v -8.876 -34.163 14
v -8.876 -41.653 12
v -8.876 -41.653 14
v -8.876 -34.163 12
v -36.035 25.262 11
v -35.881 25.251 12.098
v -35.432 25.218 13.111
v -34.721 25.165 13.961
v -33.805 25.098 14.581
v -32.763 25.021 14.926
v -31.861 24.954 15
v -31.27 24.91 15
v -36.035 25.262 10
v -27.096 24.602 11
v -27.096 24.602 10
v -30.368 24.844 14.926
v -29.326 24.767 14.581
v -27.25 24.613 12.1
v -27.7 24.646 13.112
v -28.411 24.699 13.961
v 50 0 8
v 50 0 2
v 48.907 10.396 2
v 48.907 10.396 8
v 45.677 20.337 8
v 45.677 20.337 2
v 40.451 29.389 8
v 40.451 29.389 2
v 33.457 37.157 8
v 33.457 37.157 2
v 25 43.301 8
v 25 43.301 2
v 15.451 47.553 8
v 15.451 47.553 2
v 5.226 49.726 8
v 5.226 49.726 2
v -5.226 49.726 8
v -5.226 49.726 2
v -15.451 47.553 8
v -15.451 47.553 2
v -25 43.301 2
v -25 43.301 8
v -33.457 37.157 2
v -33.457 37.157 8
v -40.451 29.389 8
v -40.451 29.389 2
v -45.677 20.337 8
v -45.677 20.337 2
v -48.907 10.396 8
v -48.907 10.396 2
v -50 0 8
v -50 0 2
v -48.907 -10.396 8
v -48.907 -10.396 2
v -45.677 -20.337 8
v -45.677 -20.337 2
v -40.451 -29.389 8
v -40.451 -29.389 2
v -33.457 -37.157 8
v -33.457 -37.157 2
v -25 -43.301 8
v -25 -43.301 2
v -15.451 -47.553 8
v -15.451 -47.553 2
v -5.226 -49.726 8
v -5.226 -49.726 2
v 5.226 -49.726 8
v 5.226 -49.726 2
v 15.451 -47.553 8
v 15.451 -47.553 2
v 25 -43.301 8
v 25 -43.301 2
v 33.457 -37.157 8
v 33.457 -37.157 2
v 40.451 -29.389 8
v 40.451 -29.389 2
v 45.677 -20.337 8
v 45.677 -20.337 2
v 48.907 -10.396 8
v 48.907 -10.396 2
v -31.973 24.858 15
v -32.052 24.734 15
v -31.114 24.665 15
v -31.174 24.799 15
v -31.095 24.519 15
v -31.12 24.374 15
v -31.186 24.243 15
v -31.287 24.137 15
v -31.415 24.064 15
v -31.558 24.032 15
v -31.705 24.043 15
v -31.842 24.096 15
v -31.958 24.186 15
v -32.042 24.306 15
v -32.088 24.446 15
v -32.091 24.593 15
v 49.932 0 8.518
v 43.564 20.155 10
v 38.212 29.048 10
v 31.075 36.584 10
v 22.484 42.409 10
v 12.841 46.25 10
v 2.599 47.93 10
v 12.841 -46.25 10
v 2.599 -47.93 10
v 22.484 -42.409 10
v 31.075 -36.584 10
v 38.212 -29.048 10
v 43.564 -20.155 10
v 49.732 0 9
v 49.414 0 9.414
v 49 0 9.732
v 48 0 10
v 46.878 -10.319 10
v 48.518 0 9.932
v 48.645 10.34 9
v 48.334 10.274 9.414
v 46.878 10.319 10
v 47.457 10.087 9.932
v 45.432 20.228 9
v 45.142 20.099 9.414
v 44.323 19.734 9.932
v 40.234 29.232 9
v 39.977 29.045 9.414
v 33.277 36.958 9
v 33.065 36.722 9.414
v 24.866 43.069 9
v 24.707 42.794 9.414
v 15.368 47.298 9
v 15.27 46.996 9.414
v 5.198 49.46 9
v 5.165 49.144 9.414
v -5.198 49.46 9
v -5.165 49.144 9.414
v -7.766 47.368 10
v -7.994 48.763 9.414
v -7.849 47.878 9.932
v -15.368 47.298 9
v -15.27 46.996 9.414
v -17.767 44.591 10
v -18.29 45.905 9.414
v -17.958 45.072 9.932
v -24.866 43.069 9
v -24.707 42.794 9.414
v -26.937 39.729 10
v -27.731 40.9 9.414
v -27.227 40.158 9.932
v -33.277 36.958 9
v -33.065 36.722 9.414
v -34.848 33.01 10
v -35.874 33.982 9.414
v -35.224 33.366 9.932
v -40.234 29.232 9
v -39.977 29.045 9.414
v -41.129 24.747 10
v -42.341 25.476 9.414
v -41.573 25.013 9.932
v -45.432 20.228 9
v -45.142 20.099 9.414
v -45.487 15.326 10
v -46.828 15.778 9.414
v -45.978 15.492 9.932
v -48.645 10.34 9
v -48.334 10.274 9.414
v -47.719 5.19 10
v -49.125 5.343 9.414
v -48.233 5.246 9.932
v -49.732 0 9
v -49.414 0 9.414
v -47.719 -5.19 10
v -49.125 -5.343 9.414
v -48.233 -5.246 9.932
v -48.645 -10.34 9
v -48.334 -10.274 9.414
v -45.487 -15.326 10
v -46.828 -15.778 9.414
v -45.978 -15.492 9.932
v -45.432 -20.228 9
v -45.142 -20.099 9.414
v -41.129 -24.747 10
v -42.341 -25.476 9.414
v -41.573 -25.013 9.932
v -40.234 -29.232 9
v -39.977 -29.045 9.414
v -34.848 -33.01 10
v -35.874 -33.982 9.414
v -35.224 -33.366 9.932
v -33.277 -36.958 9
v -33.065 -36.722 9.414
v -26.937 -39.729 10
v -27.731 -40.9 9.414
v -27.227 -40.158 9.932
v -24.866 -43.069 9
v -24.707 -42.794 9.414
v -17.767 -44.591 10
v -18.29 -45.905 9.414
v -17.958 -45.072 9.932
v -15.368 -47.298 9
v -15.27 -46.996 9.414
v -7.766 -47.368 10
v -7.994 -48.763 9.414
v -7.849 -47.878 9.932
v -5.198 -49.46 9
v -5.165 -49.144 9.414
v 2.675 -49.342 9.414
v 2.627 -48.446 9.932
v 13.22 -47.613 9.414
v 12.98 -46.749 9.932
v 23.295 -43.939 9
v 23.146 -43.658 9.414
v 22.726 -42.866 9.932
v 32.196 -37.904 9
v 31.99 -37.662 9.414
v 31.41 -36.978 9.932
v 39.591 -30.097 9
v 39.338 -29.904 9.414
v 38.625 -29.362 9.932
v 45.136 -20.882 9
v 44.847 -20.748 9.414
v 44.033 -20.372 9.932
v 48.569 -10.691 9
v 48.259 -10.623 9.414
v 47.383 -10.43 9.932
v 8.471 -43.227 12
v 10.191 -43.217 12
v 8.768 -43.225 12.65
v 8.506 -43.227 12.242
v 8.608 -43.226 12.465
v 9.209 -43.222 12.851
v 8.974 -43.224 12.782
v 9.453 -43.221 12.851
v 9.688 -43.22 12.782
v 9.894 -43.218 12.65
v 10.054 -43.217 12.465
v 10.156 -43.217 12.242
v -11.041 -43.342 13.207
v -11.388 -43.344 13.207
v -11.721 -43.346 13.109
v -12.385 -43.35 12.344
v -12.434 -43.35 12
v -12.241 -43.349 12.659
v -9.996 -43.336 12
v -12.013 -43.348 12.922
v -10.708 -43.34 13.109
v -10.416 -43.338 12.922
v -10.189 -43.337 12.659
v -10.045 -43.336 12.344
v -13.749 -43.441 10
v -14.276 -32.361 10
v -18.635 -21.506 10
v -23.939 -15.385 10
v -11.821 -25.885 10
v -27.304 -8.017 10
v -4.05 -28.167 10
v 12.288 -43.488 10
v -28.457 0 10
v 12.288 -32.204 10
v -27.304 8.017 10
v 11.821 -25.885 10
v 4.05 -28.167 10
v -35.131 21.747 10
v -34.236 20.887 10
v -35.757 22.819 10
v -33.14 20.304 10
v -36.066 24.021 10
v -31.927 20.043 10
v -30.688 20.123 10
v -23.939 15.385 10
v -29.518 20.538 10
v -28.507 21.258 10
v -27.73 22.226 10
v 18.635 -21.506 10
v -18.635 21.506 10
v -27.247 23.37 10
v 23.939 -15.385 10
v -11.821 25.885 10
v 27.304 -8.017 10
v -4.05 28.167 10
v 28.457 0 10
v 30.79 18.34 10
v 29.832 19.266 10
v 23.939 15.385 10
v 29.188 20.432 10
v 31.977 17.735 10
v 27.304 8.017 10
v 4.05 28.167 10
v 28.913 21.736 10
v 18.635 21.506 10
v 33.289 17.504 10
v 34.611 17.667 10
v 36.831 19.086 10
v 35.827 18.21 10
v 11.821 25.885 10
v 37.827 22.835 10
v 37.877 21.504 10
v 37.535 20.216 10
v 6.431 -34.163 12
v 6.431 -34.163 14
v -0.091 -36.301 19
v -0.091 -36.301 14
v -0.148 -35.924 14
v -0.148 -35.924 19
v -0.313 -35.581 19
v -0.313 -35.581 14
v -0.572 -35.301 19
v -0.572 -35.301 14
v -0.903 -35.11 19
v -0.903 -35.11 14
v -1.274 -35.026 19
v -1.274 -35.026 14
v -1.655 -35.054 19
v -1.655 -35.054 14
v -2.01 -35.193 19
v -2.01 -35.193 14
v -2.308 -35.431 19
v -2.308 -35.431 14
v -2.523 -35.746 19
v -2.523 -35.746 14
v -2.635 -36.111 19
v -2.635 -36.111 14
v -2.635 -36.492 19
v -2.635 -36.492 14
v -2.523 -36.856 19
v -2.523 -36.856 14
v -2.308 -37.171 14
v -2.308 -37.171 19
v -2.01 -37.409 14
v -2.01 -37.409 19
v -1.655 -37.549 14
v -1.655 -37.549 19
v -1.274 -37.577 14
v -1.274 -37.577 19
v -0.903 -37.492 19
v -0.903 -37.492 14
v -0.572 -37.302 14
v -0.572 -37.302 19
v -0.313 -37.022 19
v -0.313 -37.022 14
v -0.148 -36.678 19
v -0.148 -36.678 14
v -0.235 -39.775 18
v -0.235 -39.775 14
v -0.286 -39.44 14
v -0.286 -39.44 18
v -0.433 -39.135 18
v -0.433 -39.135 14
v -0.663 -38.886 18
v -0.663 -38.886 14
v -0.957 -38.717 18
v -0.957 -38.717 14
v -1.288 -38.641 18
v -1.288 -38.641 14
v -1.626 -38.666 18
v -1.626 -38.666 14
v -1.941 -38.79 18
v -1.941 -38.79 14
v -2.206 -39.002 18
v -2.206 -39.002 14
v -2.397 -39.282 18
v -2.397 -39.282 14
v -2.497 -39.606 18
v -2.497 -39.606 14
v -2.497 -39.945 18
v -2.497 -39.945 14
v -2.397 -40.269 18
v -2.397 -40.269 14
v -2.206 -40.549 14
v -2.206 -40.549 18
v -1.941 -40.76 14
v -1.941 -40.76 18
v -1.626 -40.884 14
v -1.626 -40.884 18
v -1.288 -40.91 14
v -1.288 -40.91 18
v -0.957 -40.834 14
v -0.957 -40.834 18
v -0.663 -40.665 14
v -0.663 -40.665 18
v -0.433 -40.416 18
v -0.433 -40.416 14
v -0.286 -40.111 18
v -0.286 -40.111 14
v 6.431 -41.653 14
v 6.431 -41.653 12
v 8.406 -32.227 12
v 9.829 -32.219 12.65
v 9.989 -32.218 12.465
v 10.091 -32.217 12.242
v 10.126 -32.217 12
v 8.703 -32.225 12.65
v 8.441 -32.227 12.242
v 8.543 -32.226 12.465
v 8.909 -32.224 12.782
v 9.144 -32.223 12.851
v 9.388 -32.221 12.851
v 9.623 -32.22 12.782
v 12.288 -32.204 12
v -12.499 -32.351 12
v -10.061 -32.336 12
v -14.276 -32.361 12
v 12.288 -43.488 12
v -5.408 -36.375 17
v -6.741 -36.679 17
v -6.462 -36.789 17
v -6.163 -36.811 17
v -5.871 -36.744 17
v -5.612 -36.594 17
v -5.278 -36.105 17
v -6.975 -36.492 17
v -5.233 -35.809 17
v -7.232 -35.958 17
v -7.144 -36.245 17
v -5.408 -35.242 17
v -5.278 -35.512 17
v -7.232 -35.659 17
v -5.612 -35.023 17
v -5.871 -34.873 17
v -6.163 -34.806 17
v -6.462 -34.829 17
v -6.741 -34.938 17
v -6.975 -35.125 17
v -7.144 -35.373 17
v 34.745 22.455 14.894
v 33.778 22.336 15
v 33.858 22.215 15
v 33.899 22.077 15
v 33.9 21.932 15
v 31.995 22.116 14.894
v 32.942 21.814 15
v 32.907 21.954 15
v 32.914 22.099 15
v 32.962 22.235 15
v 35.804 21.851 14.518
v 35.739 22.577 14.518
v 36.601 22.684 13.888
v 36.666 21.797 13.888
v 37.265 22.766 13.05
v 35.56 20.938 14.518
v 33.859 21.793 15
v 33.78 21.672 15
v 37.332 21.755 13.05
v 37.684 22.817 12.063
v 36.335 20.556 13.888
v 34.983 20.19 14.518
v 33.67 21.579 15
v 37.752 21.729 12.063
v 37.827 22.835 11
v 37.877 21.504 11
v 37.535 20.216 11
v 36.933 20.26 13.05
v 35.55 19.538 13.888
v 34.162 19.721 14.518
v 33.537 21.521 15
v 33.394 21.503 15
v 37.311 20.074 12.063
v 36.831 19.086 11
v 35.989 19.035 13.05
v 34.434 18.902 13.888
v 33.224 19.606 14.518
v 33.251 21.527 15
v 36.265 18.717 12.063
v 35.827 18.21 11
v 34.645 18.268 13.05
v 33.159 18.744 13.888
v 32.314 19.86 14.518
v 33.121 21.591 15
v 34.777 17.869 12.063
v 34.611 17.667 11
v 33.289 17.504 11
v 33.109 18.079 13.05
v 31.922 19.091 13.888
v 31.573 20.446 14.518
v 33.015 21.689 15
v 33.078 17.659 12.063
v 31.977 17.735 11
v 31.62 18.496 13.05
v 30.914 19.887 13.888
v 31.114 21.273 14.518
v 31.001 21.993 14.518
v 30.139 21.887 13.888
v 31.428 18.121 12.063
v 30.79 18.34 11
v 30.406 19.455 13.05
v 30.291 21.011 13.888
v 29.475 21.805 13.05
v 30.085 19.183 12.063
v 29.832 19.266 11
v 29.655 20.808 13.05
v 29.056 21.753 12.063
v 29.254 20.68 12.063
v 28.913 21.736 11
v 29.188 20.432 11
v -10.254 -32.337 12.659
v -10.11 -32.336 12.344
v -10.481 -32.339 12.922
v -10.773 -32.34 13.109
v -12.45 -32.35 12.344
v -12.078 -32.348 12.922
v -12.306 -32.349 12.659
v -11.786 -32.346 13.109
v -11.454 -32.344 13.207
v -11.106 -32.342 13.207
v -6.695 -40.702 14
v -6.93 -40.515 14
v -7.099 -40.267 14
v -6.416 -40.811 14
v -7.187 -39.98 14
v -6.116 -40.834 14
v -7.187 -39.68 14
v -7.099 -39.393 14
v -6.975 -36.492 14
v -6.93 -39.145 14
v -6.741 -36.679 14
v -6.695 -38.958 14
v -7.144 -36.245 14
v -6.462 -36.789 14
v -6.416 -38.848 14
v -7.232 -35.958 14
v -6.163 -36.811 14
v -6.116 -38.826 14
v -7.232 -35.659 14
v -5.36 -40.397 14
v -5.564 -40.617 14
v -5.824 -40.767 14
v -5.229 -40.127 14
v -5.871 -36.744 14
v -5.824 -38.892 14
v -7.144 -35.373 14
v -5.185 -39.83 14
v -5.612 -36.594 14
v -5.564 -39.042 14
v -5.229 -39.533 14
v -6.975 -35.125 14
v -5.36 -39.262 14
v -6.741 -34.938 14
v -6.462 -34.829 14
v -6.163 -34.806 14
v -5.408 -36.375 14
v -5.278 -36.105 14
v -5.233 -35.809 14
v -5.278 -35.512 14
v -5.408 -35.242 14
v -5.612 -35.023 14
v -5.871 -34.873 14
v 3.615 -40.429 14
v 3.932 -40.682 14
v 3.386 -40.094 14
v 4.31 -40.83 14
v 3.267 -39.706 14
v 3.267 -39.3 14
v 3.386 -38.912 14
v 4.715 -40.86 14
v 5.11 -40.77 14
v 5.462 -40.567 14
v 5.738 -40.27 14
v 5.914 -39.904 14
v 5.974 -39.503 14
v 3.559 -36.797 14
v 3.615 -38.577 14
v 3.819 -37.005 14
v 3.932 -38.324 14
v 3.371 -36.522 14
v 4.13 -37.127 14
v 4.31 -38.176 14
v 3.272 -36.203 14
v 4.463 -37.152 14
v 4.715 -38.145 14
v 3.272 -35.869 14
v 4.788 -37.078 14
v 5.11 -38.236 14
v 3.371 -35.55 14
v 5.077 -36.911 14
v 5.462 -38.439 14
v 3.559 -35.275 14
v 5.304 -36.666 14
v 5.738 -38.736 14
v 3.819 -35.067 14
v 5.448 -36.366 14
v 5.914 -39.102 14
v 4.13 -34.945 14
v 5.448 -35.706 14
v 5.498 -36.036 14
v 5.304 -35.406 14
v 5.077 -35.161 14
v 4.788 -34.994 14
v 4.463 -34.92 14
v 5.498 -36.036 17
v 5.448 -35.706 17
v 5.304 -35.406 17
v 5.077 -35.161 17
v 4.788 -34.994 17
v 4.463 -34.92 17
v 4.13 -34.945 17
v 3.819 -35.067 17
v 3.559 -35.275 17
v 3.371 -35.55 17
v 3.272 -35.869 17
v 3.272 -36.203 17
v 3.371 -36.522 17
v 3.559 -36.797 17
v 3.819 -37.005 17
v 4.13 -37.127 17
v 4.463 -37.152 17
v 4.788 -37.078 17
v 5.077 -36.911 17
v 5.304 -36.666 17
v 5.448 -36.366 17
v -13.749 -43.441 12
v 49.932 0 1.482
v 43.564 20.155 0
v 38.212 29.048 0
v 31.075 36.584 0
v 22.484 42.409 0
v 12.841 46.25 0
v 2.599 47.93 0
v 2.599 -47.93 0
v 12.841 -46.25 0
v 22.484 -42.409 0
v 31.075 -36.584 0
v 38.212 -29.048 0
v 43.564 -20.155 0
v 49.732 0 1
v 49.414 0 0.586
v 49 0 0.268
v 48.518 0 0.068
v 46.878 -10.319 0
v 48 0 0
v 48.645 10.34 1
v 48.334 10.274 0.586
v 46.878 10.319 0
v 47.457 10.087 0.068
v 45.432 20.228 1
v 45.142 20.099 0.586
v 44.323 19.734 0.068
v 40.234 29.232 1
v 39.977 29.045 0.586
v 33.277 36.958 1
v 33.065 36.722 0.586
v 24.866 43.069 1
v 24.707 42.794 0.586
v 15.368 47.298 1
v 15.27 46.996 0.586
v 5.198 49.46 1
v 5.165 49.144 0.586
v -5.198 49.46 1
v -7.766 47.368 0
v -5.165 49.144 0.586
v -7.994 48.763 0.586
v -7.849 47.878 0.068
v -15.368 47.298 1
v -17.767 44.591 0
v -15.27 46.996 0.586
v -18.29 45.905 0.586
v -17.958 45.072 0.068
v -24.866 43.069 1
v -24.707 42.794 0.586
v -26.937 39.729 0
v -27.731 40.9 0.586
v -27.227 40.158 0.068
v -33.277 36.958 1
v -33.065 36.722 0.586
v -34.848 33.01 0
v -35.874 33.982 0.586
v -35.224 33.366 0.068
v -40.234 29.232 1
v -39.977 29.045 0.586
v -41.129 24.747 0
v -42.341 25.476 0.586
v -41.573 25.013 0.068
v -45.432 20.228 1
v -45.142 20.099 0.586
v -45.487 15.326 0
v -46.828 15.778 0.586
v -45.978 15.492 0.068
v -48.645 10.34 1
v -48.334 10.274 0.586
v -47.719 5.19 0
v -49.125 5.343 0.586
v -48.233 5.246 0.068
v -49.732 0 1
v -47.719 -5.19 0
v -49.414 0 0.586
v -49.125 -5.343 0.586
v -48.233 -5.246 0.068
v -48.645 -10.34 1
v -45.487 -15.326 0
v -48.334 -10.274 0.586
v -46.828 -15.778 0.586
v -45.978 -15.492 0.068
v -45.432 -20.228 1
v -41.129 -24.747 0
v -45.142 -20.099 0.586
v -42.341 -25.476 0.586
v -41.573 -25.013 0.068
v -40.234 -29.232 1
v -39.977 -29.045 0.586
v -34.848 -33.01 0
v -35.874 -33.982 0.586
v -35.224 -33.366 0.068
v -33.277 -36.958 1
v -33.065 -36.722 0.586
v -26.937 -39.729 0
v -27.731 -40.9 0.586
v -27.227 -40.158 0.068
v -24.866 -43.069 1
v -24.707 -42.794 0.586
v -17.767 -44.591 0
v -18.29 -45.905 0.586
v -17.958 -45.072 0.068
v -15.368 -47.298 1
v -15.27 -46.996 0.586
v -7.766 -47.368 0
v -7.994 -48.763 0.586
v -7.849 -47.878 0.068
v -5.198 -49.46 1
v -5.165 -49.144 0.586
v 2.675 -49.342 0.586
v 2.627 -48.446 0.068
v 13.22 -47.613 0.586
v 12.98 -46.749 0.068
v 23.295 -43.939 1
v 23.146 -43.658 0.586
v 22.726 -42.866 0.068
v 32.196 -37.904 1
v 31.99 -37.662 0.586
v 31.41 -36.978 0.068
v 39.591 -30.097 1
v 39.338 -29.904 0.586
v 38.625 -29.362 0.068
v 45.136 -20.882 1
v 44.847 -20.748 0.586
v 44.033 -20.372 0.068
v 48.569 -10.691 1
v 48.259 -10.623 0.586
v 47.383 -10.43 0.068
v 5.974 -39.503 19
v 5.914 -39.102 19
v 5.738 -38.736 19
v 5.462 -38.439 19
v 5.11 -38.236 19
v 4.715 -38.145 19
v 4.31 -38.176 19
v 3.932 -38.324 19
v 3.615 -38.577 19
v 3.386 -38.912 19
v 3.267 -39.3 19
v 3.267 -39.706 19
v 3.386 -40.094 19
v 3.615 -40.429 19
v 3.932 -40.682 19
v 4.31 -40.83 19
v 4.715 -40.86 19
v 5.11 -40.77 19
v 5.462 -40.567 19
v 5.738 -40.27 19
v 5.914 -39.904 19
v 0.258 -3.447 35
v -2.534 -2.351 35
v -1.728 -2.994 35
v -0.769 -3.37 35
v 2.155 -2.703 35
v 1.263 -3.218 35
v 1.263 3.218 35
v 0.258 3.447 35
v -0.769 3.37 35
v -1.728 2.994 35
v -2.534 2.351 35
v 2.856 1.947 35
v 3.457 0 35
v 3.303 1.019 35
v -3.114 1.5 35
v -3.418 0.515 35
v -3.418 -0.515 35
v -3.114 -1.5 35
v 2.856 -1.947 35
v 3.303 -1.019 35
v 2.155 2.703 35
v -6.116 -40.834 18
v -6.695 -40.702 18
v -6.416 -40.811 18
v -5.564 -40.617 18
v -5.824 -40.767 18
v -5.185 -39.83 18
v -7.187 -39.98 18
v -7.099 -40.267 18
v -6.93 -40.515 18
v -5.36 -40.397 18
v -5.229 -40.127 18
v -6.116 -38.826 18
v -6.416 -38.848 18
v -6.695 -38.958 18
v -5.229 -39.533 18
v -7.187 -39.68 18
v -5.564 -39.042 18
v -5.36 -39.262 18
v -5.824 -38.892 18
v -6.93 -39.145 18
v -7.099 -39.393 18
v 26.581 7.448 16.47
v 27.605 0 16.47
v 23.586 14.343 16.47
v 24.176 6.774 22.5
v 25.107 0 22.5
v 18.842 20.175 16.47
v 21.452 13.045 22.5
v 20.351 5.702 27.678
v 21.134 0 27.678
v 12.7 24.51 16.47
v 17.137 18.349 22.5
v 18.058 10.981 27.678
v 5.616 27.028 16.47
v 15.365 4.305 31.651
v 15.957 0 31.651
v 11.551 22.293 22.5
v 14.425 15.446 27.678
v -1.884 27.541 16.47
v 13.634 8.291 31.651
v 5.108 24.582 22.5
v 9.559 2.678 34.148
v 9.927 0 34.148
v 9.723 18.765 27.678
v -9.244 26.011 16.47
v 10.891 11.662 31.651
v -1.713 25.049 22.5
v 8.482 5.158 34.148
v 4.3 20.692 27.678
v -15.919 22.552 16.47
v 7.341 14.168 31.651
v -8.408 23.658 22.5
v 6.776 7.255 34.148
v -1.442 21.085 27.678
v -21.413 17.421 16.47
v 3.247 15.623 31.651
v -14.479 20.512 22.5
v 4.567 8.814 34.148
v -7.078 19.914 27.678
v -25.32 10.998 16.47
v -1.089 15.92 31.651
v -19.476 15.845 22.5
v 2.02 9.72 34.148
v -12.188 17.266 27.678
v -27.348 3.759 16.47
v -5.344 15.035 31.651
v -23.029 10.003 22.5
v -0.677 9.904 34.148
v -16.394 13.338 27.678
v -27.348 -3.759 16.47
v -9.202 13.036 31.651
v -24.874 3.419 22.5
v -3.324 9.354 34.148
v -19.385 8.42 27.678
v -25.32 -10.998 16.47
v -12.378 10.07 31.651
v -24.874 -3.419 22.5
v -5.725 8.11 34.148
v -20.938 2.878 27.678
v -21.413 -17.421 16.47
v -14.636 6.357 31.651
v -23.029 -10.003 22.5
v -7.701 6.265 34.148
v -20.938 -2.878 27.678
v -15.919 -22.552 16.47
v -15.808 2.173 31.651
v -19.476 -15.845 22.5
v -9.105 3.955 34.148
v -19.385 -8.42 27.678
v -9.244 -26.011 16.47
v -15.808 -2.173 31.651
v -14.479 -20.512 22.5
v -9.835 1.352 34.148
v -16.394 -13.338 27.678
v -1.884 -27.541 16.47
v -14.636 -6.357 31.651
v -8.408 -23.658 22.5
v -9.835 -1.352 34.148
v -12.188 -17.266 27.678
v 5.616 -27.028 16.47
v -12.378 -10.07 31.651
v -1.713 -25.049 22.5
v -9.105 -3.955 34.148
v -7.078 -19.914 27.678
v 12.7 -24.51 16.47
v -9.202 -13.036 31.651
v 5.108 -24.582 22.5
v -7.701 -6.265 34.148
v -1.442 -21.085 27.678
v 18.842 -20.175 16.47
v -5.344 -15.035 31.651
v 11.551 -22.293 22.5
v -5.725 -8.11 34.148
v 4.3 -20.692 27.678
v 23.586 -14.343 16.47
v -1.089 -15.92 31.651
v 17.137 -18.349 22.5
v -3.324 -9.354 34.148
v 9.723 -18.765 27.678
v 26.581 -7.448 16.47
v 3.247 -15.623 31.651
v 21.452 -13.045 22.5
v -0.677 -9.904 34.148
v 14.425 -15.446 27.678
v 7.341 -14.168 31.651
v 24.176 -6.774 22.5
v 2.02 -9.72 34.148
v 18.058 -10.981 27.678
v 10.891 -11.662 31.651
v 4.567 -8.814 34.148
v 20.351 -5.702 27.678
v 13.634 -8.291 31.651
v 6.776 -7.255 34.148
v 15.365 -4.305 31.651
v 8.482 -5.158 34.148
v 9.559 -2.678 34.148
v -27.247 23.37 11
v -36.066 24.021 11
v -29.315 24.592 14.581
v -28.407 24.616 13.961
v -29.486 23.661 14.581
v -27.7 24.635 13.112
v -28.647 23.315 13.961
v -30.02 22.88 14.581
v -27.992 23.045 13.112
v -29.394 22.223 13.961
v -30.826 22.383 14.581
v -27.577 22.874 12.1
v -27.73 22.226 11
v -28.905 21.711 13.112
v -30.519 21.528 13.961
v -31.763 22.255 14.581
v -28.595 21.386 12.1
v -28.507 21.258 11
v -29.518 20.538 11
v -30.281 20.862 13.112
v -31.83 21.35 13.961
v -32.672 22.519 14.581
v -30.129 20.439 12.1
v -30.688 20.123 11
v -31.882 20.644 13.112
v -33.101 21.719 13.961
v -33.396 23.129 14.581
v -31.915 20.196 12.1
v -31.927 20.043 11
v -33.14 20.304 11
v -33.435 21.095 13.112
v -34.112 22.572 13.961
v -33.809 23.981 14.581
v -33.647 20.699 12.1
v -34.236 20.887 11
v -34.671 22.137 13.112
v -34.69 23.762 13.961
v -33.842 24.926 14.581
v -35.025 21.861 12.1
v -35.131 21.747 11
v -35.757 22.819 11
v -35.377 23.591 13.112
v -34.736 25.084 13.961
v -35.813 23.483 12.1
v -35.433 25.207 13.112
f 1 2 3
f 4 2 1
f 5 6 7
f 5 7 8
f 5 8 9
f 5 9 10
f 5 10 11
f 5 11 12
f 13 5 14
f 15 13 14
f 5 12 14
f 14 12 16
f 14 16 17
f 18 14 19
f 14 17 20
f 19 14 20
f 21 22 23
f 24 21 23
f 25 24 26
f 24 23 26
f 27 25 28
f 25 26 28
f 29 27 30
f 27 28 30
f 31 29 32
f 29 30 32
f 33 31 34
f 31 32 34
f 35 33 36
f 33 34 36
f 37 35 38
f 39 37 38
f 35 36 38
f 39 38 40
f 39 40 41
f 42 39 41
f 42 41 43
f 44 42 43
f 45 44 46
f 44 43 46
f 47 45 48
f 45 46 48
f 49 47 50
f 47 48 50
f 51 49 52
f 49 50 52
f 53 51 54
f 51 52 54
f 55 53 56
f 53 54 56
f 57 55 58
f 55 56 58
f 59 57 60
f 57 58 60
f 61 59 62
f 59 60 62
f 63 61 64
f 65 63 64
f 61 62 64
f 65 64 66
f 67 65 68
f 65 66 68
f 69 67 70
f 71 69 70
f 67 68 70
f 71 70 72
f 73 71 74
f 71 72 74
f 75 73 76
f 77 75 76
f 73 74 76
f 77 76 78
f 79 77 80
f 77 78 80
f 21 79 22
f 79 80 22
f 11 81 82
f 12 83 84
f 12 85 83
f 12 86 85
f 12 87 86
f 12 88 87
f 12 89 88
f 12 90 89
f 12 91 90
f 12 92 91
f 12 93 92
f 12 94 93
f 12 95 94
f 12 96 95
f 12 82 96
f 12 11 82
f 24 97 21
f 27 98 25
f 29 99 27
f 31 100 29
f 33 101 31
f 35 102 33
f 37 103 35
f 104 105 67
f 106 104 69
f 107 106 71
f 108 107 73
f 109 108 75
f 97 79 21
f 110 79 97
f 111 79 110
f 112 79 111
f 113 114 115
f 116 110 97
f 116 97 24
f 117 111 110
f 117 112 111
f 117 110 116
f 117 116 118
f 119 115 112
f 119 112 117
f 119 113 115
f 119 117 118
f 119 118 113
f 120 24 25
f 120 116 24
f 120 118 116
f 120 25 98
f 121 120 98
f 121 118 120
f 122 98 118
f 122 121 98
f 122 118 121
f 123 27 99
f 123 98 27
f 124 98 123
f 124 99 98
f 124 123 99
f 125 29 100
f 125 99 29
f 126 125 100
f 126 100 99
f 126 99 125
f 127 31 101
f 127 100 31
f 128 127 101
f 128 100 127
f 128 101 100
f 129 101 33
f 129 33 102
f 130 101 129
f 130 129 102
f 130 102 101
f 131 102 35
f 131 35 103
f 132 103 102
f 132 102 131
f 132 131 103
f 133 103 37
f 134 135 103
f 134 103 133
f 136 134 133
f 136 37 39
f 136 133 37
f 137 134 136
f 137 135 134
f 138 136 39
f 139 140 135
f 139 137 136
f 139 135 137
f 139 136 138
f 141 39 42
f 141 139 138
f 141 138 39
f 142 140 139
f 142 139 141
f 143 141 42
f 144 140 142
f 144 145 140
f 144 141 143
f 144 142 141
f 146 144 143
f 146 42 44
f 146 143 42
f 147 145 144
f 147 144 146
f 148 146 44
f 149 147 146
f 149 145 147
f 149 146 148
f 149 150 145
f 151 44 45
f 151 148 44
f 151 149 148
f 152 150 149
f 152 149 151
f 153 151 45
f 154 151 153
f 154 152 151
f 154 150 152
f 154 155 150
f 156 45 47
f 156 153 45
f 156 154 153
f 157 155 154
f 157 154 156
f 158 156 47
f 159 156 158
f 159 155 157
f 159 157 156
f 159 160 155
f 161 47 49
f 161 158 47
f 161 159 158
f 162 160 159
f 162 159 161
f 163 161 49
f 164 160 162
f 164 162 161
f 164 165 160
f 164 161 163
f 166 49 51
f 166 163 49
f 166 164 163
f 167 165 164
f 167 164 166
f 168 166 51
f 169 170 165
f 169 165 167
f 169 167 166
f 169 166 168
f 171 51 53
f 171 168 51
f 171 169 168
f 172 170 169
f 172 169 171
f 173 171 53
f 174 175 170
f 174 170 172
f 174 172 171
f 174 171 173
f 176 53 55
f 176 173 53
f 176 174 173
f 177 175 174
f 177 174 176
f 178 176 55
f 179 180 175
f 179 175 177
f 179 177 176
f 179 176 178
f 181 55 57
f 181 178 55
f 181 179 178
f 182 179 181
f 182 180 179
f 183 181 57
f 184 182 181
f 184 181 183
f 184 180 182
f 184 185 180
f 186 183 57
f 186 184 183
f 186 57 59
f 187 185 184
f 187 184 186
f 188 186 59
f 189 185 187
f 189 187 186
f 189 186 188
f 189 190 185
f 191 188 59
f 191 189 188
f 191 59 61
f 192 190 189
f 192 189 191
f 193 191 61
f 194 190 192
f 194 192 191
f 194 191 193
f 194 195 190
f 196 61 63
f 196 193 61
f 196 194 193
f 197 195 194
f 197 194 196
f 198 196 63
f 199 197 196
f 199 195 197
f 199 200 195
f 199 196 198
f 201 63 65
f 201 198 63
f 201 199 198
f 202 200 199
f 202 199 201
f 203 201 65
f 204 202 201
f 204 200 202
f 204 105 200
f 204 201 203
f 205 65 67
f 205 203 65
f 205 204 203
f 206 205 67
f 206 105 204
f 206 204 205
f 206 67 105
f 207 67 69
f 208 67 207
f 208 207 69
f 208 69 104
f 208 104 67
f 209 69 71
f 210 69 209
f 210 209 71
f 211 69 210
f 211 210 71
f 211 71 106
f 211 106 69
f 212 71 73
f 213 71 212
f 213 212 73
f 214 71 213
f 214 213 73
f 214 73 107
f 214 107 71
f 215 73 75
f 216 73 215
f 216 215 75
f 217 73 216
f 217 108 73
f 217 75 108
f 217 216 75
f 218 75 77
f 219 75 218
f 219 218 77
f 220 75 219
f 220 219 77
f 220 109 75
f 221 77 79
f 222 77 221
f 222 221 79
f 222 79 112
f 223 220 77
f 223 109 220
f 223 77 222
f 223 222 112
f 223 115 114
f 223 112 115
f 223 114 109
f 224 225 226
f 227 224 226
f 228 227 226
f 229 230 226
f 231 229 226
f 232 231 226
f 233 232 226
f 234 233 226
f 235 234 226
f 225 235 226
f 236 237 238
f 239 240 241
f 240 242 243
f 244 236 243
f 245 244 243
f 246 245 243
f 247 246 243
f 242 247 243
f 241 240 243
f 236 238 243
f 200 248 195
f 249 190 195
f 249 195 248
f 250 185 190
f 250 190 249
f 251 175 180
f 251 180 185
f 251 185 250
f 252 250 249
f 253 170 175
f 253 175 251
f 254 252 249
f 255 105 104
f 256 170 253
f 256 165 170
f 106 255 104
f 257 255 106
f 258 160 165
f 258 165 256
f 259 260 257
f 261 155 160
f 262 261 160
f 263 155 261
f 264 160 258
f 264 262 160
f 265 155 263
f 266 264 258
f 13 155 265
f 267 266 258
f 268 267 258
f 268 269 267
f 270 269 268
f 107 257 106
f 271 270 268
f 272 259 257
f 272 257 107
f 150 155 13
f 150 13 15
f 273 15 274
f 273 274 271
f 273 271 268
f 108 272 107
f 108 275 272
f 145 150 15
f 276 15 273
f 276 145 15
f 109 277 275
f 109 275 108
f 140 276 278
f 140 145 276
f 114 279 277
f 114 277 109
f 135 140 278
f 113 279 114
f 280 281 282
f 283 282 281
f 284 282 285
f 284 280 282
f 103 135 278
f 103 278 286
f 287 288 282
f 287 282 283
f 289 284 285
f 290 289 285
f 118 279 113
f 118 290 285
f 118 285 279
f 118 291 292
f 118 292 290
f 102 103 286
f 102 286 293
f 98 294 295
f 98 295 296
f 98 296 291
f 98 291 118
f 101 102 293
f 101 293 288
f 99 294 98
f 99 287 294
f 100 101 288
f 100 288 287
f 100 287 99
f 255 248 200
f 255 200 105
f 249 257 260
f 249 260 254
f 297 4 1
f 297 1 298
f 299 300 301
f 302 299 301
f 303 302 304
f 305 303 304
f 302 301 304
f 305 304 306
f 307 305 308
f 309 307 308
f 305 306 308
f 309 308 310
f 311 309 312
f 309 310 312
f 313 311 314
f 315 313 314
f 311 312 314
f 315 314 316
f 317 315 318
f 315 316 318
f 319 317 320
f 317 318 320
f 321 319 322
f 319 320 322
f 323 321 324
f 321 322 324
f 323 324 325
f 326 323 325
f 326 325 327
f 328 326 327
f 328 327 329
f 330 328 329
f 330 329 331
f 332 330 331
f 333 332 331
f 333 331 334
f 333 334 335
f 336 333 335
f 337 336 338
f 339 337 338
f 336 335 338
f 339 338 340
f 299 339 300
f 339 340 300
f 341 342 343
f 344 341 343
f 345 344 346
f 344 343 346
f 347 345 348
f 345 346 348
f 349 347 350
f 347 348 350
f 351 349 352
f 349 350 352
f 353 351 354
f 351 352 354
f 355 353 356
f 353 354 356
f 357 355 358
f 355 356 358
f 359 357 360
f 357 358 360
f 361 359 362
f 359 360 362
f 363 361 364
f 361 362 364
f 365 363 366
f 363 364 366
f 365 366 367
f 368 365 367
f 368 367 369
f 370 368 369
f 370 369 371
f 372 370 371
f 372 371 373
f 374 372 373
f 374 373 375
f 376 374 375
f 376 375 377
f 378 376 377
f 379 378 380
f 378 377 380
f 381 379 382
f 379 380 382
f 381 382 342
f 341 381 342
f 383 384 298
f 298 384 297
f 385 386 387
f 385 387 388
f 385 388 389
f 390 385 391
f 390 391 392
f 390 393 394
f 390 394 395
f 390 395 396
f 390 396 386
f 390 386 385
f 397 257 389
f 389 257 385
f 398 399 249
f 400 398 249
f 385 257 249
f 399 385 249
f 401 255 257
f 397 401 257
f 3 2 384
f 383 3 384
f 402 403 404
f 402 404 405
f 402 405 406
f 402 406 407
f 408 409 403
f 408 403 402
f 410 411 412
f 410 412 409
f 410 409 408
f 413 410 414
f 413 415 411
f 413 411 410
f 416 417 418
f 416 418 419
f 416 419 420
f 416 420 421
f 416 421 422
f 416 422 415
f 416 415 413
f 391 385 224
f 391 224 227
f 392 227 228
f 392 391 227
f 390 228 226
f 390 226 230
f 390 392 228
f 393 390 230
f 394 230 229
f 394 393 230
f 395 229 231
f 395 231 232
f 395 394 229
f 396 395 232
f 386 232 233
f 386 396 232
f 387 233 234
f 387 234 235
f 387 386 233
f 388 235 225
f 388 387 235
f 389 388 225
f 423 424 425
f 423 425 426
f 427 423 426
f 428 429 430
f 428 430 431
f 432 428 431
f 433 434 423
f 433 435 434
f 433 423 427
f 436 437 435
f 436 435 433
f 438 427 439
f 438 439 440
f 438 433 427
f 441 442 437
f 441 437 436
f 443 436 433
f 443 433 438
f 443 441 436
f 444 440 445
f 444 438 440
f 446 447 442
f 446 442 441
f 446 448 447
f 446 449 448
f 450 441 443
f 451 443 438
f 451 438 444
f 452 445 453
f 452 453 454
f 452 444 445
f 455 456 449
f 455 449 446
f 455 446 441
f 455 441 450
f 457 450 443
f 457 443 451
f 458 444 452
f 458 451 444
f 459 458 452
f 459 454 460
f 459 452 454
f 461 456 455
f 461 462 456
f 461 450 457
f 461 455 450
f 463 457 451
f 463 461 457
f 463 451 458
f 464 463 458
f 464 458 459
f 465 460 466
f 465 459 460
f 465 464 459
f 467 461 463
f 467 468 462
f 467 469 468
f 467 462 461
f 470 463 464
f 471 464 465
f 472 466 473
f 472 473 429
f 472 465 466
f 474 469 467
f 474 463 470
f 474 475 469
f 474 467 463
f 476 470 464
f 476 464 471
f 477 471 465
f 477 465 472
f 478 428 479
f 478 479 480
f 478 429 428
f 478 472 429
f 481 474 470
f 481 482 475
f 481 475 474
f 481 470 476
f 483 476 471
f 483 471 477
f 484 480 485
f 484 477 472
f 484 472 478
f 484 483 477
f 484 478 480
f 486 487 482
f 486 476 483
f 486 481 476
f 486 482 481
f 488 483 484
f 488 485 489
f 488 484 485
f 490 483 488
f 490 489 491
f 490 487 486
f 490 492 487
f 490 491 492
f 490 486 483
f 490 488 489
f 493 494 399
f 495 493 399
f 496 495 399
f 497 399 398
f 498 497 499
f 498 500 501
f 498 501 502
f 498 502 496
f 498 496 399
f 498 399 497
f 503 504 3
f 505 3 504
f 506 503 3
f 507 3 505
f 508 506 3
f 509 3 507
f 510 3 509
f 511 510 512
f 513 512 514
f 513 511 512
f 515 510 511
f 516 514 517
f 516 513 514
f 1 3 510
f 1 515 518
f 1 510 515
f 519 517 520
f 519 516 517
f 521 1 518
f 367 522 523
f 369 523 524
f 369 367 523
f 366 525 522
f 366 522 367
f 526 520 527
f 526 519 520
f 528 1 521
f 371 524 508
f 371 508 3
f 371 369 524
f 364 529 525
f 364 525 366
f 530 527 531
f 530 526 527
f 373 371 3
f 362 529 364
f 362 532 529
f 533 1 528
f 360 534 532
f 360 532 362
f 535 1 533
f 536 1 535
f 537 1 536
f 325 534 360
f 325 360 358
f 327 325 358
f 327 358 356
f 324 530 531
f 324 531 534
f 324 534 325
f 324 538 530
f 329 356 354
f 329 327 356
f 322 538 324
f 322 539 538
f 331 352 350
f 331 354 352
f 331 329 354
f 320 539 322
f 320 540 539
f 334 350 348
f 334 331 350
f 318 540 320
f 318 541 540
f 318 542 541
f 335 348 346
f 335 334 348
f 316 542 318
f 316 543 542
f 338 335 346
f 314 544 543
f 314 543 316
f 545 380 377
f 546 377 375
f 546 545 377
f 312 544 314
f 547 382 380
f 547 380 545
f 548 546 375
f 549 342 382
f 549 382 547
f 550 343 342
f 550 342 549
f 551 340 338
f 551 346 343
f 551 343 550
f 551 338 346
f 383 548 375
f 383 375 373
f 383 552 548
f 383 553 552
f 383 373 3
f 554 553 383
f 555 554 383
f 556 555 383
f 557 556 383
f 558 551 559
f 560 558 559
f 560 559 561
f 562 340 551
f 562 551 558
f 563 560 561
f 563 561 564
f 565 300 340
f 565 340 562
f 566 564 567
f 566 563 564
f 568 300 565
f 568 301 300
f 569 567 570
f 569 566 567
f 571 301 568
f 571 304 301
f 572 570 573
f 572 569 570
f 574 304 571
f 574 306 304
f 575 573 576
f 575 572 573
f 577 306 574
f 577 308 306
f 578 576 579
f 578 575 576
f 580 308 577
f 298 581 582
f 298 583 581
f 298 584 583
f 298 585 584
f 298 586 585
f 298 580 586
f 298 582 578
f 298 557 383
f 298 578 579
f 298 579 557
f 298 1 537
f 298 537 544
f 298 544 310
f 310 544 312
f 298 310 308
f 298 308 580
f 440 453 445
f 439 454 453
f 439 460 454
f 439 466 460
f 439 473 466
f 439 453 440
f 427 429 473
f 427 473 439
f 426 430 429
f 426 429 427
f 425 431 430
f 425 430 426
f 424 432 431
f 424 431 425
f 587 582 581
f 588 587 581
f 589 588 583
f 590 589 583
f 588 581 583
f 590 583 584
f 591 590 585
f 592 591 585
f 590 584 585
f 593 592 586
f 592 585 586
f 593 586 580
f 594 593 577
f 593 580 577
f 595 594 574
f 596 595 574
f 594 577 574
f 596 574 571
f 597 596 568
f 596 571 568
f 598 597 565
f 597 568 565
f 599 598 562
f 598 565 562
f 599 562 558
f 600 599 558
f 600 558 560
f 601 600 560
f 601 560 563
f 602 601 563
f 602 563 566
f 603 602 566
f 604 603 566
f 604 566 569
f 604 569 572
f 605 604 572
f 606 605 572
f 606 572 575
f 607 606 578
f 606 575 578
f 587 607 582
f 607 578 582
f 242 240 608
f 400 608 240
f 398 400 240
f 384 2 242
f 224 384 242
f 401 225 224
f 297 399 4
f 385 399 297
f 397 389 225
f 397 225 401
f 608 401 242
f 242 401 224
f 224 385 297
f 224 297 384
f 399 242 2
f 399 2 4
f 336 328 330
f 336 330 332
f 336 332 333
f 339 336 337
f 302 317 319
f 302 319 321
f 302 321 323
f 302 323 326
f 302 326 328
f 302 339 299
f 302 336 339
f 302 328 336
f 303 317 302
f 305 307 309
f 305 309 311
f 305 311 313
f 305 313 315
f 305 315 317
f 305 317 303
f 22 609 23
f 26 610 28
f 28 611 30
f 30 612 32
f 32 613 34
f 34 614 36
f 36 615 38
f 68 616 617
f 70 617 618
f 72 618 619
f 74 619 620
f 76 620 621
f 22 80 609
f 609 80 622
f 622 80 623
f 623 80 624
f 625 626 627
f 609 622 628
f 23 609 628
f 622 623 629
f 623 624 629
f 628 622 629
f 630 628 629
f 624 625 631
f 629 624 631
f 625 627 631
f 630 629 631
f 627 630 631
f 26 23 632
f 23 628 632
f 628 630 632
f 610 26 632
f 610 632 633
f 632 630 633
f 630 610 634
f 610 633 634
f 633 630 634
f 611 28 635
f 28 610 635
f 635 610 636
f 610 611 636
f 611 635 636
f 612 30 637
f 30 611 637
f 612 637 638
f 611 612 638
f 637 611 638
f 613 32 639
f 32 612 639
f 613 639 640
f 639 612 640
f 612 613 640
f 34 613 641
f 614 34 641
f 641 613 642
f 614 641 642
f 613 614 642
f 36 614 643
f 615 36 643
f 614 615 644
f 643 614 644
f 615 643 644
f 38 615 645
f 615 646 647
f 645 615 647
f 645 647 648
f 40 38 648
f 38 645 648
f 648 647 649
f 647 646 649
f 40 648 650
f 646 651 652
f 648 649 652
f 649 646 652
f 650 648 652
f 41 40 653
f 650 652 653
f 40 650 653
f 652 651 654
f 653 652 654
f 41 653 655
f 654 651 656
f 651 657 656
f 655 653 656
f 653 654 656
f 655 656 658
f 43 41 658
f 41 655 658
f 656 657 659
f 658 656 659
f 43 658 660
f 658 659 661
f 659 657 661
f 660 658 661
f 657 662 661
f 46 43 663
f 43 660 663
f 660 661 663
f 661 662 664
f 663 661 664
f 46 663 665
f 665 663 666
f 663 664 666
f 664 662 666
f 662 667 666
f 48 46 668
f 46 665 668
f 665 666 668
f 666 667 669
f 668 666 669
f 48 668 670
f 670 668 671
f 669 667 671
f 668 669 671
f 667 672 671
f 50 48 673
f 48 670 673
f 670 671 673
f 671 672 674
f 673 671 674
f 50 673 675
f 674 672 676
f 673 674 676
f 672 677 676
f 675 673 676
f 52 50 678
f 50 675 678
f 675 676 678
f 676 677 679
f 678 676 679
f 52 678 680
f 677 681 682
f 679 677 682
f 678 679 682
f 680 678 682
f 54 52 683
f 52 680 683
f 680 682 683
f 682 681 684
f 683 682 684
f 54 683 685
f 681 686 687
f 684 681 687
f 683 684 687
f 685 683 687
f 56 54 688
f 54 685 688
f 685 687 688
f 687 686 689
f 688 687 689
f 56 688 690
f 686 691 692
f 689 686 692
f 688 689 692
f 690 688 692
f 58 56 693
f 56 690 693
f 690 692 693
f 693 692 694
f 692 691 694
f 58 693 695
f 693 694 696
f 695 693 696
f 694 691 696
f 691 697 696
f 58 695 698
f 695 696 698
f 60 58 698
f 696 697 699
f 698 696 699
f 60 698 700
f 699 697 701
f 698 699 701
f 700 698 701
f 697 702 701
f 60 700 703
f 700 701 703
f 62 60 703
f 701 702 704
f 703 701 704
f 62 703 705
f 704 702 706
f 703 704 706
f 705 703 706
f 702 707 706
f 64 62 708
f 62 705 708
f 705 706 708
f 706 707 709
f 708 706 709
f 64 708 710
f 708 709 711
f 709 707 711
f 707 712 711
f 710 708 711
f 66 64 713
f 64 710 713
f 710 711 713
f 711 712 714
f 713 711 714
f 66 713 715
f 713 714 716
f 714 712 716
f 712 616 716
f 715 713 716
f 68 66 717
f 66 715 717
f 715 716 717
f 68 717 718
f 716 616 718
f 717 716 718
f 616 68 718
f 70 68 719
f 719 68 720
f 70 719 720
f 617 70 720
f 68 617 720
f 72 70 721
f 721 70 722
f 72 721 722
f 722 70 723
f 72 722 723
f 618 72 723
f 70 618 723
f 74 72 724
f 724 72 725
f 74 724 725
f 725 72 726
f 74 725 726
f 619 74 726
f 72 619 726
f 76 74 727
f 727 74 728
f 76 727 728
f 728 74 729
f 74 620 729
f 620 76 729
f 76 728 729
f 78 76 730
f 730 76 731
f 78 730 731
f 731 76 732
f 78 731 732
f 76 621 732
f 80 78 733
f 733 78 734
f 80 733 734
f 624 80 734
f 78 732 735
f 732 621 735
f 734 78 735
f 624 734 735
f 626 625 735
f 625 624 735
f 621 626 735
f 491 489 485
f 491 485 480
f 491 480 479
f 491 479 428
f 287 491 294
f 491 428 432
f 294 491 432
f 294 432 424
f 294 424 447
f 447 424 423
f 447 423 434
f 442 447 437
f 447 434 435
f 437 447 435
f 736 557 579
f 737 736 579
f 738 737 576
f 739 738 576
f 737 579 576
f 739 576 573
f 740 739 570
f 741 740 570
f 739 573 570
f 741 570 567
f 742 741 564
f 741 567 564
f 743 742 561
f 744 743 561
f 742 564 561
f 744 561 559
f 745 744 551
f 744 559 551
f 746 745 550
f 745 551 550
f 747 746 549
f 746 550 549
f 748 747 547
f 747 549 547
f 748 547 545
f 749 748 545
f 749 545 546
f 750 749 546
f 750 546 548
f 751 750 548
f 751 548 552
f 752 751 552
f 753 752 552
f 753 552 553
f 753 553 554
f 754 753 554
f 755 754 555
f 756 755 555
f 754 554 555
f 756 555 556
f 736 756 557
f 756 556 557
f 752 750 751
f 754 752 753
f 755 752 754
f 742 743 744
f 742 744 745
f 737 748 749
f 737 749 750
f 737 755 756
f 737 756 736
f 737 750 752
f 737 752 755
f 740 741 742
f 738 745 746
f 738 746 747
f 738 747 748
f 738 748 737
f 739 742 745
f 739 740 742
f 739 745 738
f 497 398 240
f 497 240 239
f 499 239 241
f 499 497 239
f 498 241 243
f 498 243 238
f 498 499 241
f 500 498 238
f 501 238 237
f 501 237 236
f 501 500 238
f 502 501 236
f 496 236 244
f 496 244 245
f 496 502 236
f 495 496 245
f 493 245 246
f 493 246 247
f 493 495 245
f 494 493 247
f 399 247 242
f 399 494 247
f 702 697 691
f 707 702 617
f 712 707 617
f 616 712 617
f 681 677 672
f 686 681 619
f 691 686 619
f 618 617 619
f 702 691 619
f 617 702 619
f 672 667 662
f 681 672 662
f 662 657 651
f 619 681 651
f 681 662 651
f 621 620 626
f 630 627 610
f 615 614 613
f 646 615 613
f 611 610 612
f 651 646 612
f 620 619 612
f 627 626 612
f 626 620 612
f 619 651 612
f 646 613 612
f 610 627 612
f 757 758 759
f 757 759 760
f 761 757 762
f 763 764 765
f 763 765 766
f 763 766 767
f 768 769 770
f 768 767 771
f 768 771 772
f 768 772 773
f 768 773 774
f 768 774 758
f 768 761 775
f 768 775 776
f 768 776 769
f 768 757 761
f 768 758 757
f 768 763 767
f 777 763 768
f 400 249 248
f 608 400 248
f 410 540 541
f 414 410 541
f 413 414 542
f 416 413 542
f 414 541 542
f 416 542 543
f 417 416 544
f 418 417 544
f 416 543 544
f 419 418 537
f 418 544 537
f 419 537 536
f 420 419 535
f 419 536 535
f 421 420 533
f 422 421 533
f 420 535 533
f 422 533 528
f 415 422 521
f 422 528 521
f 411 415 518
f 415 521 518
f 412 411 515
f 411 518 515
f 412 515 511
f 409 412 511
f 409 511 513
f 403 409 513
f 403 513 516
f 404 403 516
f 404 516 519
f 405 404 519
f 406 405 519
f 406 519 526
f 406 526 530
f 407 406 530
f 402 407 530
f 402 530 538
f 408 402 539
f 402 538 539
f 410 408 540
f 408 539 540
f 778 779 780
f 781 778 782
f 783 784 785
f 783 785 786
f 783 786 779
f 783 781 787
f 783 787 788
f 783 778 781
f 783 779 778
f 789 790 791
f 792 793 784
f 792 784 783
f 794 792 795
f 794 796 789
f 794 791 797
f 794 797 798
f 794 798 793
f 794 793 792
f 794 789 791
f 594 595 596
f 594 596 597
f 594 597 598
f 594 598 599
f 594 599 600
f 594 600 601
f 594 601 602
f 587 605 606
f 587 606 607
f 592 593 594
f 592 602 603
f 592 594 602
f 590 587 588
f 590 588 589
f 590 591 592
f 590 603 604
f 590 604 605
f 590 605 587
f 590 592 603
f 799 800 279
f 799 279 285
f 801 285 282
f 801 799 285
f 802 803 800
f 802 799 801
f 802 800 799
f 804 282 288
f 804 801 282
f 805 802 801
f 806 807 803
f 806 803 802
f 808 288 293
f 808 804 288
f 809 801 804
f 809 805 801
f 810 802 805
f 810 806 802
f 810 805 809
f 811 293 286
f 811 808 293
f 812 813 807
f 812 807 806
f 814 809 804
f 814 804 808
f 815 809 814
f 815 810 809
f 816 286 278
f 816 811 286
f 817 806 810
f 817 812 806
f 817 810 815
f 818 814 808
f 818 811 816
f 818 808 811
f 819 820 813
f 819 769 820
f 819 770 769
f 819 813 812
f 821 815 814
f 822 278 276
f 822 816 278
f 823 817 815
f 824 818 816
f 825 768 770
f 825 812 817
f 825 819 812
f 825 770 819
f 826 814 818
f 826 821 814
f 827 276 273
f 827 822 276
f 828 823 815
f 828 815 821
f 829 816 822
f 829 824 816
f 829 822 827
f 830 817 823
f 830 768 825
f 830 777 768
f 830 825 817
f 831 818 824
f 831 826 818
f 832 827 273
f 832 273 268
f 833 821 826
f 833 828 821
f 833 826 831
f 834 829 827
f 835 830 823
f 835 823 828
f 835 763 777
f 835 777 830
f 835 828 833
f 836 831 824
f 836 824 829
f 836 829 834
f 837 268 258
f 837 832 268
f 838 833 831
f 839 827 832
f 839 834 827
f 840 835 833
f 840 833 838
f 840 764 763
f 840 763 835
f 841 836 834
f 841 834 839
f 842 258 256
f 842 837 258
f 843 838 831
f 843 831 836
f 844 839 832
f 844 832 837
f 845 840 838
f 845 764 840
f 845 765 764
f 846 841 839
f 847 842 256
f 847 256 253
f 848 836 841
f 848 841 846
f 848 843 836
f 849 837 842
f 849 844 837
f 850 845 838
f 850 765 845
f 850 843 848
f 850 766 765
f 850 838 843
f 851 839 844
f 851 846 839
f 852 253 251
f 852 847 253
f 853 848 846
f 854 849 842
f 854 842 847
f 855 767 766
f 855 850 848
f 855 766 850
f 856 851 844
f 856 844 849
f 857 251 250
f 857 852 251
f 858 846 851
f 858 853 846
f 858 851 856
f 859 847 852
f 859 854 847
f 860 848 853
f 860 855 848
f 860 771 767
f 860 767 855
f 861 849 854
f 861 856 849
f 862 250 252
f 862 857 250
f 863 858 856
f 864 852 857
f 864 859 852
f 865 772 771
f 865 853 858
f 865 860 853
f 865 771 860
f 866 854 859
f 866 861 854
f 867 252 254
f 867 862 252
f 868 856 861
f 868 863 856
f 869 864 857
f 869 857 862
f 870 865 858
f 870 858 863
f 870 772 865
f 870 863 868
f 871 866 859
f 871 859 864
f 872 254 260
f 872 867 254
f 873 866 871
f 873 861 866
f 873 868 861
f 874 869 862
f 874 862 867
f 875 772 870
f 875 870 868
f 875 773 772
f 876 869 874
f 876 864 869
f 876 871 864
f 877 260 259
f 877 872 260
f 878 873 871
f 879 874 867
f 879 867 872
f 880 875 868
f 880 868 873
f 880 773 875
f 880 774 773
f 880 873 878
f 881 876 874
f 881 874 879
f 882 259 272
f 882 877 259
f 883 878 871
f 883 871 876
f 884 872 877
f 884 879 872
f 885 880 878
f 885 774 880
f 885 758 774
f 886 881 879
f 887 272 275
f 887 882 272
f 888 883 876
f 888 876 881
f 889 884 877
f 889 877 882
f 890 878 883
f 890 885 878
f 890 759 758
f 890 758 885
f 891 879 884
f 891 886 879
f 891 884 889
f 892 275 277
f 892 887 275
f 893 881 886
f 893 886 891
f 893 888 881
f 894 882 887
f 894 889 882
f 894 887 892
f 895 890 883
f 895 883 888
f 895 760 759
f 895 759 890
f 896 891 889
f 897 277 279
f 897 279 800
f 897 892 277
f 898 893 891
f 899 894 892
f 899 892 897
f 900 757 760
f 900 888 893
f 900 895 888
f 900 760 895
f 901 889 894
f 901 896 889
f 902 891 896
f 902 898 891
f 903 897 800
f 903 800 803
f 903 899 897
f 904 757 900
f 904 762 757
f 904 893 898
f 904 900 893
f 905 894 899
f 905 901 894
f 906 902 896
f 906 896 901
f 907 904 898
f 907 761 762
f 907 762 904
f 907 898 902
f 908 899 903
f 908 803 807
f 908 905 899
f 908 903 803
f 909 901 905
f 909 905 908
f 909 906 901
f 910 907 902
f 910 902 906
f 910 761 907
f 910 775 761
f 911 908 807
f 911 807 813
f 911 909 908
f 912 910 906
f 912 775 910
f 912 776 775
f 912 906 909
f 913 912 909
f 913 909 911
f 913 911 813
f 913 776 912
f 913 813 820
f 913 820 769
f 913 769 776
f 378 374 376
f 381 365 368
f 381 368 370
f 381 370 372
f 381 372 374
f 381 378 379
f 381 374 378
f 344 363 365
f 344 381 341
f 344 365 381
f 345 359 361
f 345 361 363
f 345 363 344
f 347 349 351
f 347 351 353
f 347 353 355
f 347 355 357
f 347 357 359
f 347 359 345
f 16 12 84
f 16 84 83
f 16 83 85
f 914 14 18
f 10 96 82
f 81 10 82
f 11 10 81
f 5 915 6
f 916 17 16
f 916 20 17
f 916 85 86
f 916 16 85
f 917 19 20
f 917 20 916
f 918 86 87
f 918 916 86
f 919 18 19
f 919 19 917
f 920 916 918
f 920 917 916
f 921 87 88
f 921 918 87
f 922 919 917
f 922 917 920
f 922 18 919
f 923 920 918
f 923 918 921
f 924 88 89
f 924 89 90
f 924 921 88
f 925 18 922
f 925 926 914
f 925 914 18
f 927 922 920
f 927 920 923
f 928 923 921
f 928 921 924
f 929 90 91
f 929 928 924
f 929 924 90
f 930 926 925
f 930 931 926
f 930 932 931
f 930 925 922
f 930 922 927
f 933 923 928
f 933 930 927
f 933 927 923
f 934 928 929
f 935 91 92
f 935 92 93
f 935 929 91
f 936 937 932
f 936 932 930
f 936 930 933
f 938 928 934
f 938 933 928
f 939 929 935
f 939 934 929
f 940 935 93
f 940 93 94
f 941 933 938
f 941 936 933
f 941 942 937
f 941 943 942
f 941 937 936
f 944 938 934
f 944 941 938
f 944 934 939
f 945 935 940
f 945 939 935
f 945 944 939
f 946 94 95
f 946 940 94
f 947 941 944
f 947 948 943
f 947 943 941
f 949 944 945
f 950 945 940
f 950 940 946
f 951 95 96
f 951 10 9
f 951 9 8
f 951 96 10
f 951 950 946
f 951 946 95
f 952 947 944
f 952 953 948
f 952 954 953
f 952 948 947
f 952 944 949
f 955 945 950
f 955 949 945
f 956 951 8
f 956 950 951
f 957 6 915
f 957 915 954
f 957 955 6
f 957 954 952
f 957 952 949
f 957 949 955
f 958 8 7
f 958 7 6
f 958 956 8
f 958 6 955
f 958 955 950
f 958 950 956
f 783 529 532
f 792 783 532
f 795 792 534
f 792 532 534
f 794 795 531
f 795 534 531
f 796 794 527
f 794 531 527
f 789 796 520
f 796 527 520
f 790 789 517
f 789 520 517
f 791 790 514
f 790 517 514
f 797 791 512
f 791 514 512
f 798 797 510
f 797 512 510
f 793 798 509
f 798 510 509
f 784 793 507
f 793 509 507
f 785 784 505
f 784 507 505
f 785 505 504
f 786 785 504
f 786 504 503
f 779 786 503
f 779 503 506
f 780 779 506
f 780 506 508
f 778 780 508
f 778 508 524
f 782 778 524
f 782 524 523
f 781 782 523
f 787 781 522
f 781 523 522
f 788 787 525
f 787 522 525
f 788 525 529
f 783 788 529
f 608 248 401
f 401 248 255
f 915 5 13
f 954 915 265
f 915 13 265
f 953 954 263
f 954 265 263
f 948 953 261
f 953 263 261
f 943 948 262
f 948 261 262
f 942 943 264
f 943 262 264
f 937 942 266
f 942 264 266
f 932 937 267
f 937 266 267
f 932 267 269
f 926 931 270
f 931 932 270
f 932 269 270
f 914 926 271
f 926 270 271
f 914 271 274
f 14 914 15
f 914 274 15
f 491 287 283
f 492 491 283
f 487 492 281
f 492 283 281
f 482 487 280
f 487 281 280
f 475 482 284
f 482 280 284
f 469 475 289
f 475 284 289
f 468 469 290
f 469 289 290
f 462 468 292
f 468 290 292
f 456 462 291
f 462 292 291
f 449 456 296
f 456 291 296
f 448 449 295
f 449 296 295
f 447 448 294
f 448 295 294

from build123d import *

# Parameters (mm, degrees)
F0_R      = 50
F1_DEPTH  = 10
F2_R      = 2
F3_R      = 28.456793416
F4_DEPTH  = 25
F5_R      = 24.99999
F6_R      = 4.5
F7_DEPTH  = 5
F9_DEPTH  = 5
F10_R     = 4
F12_DEPTH = 5
F13_R     = 4
F15_DEPTH = 2
F16_R     = 0.8595542321
F16_R_2   = 1.219346416
F17_DEPTH = 11
F18_W     = 15.3063726611
F18_H     = 7.4906051159
F19_DEPTH = 2
F20_R     = 1.3613365602
F20_R_2   = 1.2793093954
F21_DEPTH = 5
F20_R_3   = 1.0051427106
F20_R_4   = 1.1191673647
F22_DEPTH = 3
F20_R_5   = 1.0069734003
F20_R_6   = 1.1374722919
F23_DEPTH = 4


# Not quite as in the source:
# - a fillet or chamfer is up to 0.001 mm smaller than in the source, because OpenCascade refuses the exact size


with BuildPart() as f1:
    # F0 (on Top) → F1 (new body)
    with BuildSketch(Plane.XY):
        Circle(F0_R)
    extrude(amount=F1_DEPTH)

    # F2
    f2_edges = [f1.edges().sort_by_distance(p)[0] for p in [
        (-50, 0, 10),
        (-50, 0, 0),
    ]]
    fillet(f2_edges, radius=F2_R)

    # F3 (on face) → F4 (join)
    with BuildSketch(Plane.XY.offset(10)):
        Circle(F3_R)
    extrude(amount=F4_DEPTH)

    # F5 (radius 25 in the source; OpenCascade refuses exactly that, so slightly less here)
    f5_edges = [f1.edges().sort_by_distance(p)[0] for p in [
        (-28.456793, 0, 35),
    ]]
    fillet(f5_edges, radius=F5_R)

    # F6 (on face) → F7 (join)
    with BuildSketch(Plane.XY.offset(10)):
        with Locations((-31.595224242, 24.5304261092)):
            Circle(F6_R)
        with Locations((33.404775758, 22.0027488409)):
            Circle(F6_R)
    extrude(amount=F7_DEPTH)

    # F8 (on face) → F9 (cut)
    with BuildSketch(Plane.XY.offset(15)):
        with BuildLine():
            Line((28.9127137026, 21.7355813083), (37.8271397629, 22.8350328115))
            ThreePointArc((37.8271397629, 22.8350328115), (32.8360512403, 26.6140051327), (28.9127137026, 21.7355813083))
        make_face()
        with BuildLine():
            Line((28.9127137026, 21.7355813083), (37.8271397629, 22.8350328115))
            ThreePointArc((37.8271397629, 22.8350328115), (32.8539465135, 26.4689090646), (28.9127137026, 21.7355813083))
        make_face()
    extrude(amount=-F9_DEPTH, mode=Mode.SUBTRACT)

    # F10
    f10_edges = [f1.edges().sort_by_distance(p)[0] for p in [
        (33.955605, 17.536589, 15),
    ]]
    fillet(f10_edges, radius=F10_R)

    # F11 (on face) → F12 (cut)
    with BuildSketch(Plane.XY.offset(15)):
        with BuildLine():
            Line((-36.0353056642, 25.2623256677), (-27.0957896794, 24.6017606519))
            ThreePointArc((-27.0957896794, 24.6017606519), (-31.2565181281, 29.1141819041), (-36.0353056642, 25.2623256677))
        make_face()
        with BuildLine():
            Line((-36.0353056642, 25.2623256677), (-27.0957896794, 24.6017606519))
            ThreePointArc((-27.0957896794, 24.6017606519), (-31.2636111635, 29.0181908942), (-36.0353056642, 25.2623256677))
        make_face()
    extrude(amount=-F12_DEPTH, mode=Mode.SUBTRACT)

    # F13
    f13_edges = [f1.edges().sort_by_distance(p)[0] for p in [
        (-31.926837, 20.042661, 15),
    ]]
    fillet(f13_edges, radius=F13_R)

    # F14 (on face) → F15 (join)
    with BuildSketch(Plane.XY.offset(10)):
        Polygon((-13.7490294874, -43.4411987662), (12.2883236036, -43.4879809618), (12.2883236036, -32.2040617466), (-14.2757371068, -32.3610827327), align=None)
    extrude(amount=F15_DEPTH)

    # F16 (on face) → F17 (join)
    with BuildSketch(Plane(origin=(0.1907818986, -32.2755706905, 0), x_dir=(-0.9999825303, -0.0059109277, 0), z_dir=(-0.0059109277, 0.9999825303, 0))):
        with Locations((-9.0753892437, 12)):
            Circle(F16_R)
        with Locations((11.4709548652, 12)):
            Circle(F16_R_2)
    extrude(amount=-F17_DEPTH)

    # F18 (on face) → F19 (join)
    with BuildSketch(Plane.XY.offset(12)):
        with Locations((-1.2223811354, -37.9079021513)):
            Rectangle(F18_W, F18_H)
    extrude(amount=F19_DEPTH)

    # F20 (on face) → F21 (join)
    with BuildSketch(Plane.XY.offset(14)):
        with Locations((4.6129520051, -39.5028851926)):
            Circle(F20_R)
        with Locations((-1.3699786505, -36.3012962043)):
            Circle(F20_R_2)
    extrude(amount=F21_DEPTH)

    # F20 (on face) → F22 (join)
    with BuildSketch(Plane.XY.offset(14)):
        with Locations((-6.2384037301, -35.8086153865)):
            Circle(F20_R_3)
        with Locations((4.3789707124, -36.0359735787)):
            Circle(F20_R_4)
    extrude(amount=F22_DEPTH)

    # F20 (on face) → F23 (join)
    with BuildSketch(Plane.XY.offset(14)):
        with Locations((-6.1916210689, -39.8297198117)):
            Circle(F20_R_5)
        with Locations((-1.3725927565, -39.7753641009)):
            Circle(F20_R_6)
    extrude(amount=F23_DEPTH)


solid = f1.part
